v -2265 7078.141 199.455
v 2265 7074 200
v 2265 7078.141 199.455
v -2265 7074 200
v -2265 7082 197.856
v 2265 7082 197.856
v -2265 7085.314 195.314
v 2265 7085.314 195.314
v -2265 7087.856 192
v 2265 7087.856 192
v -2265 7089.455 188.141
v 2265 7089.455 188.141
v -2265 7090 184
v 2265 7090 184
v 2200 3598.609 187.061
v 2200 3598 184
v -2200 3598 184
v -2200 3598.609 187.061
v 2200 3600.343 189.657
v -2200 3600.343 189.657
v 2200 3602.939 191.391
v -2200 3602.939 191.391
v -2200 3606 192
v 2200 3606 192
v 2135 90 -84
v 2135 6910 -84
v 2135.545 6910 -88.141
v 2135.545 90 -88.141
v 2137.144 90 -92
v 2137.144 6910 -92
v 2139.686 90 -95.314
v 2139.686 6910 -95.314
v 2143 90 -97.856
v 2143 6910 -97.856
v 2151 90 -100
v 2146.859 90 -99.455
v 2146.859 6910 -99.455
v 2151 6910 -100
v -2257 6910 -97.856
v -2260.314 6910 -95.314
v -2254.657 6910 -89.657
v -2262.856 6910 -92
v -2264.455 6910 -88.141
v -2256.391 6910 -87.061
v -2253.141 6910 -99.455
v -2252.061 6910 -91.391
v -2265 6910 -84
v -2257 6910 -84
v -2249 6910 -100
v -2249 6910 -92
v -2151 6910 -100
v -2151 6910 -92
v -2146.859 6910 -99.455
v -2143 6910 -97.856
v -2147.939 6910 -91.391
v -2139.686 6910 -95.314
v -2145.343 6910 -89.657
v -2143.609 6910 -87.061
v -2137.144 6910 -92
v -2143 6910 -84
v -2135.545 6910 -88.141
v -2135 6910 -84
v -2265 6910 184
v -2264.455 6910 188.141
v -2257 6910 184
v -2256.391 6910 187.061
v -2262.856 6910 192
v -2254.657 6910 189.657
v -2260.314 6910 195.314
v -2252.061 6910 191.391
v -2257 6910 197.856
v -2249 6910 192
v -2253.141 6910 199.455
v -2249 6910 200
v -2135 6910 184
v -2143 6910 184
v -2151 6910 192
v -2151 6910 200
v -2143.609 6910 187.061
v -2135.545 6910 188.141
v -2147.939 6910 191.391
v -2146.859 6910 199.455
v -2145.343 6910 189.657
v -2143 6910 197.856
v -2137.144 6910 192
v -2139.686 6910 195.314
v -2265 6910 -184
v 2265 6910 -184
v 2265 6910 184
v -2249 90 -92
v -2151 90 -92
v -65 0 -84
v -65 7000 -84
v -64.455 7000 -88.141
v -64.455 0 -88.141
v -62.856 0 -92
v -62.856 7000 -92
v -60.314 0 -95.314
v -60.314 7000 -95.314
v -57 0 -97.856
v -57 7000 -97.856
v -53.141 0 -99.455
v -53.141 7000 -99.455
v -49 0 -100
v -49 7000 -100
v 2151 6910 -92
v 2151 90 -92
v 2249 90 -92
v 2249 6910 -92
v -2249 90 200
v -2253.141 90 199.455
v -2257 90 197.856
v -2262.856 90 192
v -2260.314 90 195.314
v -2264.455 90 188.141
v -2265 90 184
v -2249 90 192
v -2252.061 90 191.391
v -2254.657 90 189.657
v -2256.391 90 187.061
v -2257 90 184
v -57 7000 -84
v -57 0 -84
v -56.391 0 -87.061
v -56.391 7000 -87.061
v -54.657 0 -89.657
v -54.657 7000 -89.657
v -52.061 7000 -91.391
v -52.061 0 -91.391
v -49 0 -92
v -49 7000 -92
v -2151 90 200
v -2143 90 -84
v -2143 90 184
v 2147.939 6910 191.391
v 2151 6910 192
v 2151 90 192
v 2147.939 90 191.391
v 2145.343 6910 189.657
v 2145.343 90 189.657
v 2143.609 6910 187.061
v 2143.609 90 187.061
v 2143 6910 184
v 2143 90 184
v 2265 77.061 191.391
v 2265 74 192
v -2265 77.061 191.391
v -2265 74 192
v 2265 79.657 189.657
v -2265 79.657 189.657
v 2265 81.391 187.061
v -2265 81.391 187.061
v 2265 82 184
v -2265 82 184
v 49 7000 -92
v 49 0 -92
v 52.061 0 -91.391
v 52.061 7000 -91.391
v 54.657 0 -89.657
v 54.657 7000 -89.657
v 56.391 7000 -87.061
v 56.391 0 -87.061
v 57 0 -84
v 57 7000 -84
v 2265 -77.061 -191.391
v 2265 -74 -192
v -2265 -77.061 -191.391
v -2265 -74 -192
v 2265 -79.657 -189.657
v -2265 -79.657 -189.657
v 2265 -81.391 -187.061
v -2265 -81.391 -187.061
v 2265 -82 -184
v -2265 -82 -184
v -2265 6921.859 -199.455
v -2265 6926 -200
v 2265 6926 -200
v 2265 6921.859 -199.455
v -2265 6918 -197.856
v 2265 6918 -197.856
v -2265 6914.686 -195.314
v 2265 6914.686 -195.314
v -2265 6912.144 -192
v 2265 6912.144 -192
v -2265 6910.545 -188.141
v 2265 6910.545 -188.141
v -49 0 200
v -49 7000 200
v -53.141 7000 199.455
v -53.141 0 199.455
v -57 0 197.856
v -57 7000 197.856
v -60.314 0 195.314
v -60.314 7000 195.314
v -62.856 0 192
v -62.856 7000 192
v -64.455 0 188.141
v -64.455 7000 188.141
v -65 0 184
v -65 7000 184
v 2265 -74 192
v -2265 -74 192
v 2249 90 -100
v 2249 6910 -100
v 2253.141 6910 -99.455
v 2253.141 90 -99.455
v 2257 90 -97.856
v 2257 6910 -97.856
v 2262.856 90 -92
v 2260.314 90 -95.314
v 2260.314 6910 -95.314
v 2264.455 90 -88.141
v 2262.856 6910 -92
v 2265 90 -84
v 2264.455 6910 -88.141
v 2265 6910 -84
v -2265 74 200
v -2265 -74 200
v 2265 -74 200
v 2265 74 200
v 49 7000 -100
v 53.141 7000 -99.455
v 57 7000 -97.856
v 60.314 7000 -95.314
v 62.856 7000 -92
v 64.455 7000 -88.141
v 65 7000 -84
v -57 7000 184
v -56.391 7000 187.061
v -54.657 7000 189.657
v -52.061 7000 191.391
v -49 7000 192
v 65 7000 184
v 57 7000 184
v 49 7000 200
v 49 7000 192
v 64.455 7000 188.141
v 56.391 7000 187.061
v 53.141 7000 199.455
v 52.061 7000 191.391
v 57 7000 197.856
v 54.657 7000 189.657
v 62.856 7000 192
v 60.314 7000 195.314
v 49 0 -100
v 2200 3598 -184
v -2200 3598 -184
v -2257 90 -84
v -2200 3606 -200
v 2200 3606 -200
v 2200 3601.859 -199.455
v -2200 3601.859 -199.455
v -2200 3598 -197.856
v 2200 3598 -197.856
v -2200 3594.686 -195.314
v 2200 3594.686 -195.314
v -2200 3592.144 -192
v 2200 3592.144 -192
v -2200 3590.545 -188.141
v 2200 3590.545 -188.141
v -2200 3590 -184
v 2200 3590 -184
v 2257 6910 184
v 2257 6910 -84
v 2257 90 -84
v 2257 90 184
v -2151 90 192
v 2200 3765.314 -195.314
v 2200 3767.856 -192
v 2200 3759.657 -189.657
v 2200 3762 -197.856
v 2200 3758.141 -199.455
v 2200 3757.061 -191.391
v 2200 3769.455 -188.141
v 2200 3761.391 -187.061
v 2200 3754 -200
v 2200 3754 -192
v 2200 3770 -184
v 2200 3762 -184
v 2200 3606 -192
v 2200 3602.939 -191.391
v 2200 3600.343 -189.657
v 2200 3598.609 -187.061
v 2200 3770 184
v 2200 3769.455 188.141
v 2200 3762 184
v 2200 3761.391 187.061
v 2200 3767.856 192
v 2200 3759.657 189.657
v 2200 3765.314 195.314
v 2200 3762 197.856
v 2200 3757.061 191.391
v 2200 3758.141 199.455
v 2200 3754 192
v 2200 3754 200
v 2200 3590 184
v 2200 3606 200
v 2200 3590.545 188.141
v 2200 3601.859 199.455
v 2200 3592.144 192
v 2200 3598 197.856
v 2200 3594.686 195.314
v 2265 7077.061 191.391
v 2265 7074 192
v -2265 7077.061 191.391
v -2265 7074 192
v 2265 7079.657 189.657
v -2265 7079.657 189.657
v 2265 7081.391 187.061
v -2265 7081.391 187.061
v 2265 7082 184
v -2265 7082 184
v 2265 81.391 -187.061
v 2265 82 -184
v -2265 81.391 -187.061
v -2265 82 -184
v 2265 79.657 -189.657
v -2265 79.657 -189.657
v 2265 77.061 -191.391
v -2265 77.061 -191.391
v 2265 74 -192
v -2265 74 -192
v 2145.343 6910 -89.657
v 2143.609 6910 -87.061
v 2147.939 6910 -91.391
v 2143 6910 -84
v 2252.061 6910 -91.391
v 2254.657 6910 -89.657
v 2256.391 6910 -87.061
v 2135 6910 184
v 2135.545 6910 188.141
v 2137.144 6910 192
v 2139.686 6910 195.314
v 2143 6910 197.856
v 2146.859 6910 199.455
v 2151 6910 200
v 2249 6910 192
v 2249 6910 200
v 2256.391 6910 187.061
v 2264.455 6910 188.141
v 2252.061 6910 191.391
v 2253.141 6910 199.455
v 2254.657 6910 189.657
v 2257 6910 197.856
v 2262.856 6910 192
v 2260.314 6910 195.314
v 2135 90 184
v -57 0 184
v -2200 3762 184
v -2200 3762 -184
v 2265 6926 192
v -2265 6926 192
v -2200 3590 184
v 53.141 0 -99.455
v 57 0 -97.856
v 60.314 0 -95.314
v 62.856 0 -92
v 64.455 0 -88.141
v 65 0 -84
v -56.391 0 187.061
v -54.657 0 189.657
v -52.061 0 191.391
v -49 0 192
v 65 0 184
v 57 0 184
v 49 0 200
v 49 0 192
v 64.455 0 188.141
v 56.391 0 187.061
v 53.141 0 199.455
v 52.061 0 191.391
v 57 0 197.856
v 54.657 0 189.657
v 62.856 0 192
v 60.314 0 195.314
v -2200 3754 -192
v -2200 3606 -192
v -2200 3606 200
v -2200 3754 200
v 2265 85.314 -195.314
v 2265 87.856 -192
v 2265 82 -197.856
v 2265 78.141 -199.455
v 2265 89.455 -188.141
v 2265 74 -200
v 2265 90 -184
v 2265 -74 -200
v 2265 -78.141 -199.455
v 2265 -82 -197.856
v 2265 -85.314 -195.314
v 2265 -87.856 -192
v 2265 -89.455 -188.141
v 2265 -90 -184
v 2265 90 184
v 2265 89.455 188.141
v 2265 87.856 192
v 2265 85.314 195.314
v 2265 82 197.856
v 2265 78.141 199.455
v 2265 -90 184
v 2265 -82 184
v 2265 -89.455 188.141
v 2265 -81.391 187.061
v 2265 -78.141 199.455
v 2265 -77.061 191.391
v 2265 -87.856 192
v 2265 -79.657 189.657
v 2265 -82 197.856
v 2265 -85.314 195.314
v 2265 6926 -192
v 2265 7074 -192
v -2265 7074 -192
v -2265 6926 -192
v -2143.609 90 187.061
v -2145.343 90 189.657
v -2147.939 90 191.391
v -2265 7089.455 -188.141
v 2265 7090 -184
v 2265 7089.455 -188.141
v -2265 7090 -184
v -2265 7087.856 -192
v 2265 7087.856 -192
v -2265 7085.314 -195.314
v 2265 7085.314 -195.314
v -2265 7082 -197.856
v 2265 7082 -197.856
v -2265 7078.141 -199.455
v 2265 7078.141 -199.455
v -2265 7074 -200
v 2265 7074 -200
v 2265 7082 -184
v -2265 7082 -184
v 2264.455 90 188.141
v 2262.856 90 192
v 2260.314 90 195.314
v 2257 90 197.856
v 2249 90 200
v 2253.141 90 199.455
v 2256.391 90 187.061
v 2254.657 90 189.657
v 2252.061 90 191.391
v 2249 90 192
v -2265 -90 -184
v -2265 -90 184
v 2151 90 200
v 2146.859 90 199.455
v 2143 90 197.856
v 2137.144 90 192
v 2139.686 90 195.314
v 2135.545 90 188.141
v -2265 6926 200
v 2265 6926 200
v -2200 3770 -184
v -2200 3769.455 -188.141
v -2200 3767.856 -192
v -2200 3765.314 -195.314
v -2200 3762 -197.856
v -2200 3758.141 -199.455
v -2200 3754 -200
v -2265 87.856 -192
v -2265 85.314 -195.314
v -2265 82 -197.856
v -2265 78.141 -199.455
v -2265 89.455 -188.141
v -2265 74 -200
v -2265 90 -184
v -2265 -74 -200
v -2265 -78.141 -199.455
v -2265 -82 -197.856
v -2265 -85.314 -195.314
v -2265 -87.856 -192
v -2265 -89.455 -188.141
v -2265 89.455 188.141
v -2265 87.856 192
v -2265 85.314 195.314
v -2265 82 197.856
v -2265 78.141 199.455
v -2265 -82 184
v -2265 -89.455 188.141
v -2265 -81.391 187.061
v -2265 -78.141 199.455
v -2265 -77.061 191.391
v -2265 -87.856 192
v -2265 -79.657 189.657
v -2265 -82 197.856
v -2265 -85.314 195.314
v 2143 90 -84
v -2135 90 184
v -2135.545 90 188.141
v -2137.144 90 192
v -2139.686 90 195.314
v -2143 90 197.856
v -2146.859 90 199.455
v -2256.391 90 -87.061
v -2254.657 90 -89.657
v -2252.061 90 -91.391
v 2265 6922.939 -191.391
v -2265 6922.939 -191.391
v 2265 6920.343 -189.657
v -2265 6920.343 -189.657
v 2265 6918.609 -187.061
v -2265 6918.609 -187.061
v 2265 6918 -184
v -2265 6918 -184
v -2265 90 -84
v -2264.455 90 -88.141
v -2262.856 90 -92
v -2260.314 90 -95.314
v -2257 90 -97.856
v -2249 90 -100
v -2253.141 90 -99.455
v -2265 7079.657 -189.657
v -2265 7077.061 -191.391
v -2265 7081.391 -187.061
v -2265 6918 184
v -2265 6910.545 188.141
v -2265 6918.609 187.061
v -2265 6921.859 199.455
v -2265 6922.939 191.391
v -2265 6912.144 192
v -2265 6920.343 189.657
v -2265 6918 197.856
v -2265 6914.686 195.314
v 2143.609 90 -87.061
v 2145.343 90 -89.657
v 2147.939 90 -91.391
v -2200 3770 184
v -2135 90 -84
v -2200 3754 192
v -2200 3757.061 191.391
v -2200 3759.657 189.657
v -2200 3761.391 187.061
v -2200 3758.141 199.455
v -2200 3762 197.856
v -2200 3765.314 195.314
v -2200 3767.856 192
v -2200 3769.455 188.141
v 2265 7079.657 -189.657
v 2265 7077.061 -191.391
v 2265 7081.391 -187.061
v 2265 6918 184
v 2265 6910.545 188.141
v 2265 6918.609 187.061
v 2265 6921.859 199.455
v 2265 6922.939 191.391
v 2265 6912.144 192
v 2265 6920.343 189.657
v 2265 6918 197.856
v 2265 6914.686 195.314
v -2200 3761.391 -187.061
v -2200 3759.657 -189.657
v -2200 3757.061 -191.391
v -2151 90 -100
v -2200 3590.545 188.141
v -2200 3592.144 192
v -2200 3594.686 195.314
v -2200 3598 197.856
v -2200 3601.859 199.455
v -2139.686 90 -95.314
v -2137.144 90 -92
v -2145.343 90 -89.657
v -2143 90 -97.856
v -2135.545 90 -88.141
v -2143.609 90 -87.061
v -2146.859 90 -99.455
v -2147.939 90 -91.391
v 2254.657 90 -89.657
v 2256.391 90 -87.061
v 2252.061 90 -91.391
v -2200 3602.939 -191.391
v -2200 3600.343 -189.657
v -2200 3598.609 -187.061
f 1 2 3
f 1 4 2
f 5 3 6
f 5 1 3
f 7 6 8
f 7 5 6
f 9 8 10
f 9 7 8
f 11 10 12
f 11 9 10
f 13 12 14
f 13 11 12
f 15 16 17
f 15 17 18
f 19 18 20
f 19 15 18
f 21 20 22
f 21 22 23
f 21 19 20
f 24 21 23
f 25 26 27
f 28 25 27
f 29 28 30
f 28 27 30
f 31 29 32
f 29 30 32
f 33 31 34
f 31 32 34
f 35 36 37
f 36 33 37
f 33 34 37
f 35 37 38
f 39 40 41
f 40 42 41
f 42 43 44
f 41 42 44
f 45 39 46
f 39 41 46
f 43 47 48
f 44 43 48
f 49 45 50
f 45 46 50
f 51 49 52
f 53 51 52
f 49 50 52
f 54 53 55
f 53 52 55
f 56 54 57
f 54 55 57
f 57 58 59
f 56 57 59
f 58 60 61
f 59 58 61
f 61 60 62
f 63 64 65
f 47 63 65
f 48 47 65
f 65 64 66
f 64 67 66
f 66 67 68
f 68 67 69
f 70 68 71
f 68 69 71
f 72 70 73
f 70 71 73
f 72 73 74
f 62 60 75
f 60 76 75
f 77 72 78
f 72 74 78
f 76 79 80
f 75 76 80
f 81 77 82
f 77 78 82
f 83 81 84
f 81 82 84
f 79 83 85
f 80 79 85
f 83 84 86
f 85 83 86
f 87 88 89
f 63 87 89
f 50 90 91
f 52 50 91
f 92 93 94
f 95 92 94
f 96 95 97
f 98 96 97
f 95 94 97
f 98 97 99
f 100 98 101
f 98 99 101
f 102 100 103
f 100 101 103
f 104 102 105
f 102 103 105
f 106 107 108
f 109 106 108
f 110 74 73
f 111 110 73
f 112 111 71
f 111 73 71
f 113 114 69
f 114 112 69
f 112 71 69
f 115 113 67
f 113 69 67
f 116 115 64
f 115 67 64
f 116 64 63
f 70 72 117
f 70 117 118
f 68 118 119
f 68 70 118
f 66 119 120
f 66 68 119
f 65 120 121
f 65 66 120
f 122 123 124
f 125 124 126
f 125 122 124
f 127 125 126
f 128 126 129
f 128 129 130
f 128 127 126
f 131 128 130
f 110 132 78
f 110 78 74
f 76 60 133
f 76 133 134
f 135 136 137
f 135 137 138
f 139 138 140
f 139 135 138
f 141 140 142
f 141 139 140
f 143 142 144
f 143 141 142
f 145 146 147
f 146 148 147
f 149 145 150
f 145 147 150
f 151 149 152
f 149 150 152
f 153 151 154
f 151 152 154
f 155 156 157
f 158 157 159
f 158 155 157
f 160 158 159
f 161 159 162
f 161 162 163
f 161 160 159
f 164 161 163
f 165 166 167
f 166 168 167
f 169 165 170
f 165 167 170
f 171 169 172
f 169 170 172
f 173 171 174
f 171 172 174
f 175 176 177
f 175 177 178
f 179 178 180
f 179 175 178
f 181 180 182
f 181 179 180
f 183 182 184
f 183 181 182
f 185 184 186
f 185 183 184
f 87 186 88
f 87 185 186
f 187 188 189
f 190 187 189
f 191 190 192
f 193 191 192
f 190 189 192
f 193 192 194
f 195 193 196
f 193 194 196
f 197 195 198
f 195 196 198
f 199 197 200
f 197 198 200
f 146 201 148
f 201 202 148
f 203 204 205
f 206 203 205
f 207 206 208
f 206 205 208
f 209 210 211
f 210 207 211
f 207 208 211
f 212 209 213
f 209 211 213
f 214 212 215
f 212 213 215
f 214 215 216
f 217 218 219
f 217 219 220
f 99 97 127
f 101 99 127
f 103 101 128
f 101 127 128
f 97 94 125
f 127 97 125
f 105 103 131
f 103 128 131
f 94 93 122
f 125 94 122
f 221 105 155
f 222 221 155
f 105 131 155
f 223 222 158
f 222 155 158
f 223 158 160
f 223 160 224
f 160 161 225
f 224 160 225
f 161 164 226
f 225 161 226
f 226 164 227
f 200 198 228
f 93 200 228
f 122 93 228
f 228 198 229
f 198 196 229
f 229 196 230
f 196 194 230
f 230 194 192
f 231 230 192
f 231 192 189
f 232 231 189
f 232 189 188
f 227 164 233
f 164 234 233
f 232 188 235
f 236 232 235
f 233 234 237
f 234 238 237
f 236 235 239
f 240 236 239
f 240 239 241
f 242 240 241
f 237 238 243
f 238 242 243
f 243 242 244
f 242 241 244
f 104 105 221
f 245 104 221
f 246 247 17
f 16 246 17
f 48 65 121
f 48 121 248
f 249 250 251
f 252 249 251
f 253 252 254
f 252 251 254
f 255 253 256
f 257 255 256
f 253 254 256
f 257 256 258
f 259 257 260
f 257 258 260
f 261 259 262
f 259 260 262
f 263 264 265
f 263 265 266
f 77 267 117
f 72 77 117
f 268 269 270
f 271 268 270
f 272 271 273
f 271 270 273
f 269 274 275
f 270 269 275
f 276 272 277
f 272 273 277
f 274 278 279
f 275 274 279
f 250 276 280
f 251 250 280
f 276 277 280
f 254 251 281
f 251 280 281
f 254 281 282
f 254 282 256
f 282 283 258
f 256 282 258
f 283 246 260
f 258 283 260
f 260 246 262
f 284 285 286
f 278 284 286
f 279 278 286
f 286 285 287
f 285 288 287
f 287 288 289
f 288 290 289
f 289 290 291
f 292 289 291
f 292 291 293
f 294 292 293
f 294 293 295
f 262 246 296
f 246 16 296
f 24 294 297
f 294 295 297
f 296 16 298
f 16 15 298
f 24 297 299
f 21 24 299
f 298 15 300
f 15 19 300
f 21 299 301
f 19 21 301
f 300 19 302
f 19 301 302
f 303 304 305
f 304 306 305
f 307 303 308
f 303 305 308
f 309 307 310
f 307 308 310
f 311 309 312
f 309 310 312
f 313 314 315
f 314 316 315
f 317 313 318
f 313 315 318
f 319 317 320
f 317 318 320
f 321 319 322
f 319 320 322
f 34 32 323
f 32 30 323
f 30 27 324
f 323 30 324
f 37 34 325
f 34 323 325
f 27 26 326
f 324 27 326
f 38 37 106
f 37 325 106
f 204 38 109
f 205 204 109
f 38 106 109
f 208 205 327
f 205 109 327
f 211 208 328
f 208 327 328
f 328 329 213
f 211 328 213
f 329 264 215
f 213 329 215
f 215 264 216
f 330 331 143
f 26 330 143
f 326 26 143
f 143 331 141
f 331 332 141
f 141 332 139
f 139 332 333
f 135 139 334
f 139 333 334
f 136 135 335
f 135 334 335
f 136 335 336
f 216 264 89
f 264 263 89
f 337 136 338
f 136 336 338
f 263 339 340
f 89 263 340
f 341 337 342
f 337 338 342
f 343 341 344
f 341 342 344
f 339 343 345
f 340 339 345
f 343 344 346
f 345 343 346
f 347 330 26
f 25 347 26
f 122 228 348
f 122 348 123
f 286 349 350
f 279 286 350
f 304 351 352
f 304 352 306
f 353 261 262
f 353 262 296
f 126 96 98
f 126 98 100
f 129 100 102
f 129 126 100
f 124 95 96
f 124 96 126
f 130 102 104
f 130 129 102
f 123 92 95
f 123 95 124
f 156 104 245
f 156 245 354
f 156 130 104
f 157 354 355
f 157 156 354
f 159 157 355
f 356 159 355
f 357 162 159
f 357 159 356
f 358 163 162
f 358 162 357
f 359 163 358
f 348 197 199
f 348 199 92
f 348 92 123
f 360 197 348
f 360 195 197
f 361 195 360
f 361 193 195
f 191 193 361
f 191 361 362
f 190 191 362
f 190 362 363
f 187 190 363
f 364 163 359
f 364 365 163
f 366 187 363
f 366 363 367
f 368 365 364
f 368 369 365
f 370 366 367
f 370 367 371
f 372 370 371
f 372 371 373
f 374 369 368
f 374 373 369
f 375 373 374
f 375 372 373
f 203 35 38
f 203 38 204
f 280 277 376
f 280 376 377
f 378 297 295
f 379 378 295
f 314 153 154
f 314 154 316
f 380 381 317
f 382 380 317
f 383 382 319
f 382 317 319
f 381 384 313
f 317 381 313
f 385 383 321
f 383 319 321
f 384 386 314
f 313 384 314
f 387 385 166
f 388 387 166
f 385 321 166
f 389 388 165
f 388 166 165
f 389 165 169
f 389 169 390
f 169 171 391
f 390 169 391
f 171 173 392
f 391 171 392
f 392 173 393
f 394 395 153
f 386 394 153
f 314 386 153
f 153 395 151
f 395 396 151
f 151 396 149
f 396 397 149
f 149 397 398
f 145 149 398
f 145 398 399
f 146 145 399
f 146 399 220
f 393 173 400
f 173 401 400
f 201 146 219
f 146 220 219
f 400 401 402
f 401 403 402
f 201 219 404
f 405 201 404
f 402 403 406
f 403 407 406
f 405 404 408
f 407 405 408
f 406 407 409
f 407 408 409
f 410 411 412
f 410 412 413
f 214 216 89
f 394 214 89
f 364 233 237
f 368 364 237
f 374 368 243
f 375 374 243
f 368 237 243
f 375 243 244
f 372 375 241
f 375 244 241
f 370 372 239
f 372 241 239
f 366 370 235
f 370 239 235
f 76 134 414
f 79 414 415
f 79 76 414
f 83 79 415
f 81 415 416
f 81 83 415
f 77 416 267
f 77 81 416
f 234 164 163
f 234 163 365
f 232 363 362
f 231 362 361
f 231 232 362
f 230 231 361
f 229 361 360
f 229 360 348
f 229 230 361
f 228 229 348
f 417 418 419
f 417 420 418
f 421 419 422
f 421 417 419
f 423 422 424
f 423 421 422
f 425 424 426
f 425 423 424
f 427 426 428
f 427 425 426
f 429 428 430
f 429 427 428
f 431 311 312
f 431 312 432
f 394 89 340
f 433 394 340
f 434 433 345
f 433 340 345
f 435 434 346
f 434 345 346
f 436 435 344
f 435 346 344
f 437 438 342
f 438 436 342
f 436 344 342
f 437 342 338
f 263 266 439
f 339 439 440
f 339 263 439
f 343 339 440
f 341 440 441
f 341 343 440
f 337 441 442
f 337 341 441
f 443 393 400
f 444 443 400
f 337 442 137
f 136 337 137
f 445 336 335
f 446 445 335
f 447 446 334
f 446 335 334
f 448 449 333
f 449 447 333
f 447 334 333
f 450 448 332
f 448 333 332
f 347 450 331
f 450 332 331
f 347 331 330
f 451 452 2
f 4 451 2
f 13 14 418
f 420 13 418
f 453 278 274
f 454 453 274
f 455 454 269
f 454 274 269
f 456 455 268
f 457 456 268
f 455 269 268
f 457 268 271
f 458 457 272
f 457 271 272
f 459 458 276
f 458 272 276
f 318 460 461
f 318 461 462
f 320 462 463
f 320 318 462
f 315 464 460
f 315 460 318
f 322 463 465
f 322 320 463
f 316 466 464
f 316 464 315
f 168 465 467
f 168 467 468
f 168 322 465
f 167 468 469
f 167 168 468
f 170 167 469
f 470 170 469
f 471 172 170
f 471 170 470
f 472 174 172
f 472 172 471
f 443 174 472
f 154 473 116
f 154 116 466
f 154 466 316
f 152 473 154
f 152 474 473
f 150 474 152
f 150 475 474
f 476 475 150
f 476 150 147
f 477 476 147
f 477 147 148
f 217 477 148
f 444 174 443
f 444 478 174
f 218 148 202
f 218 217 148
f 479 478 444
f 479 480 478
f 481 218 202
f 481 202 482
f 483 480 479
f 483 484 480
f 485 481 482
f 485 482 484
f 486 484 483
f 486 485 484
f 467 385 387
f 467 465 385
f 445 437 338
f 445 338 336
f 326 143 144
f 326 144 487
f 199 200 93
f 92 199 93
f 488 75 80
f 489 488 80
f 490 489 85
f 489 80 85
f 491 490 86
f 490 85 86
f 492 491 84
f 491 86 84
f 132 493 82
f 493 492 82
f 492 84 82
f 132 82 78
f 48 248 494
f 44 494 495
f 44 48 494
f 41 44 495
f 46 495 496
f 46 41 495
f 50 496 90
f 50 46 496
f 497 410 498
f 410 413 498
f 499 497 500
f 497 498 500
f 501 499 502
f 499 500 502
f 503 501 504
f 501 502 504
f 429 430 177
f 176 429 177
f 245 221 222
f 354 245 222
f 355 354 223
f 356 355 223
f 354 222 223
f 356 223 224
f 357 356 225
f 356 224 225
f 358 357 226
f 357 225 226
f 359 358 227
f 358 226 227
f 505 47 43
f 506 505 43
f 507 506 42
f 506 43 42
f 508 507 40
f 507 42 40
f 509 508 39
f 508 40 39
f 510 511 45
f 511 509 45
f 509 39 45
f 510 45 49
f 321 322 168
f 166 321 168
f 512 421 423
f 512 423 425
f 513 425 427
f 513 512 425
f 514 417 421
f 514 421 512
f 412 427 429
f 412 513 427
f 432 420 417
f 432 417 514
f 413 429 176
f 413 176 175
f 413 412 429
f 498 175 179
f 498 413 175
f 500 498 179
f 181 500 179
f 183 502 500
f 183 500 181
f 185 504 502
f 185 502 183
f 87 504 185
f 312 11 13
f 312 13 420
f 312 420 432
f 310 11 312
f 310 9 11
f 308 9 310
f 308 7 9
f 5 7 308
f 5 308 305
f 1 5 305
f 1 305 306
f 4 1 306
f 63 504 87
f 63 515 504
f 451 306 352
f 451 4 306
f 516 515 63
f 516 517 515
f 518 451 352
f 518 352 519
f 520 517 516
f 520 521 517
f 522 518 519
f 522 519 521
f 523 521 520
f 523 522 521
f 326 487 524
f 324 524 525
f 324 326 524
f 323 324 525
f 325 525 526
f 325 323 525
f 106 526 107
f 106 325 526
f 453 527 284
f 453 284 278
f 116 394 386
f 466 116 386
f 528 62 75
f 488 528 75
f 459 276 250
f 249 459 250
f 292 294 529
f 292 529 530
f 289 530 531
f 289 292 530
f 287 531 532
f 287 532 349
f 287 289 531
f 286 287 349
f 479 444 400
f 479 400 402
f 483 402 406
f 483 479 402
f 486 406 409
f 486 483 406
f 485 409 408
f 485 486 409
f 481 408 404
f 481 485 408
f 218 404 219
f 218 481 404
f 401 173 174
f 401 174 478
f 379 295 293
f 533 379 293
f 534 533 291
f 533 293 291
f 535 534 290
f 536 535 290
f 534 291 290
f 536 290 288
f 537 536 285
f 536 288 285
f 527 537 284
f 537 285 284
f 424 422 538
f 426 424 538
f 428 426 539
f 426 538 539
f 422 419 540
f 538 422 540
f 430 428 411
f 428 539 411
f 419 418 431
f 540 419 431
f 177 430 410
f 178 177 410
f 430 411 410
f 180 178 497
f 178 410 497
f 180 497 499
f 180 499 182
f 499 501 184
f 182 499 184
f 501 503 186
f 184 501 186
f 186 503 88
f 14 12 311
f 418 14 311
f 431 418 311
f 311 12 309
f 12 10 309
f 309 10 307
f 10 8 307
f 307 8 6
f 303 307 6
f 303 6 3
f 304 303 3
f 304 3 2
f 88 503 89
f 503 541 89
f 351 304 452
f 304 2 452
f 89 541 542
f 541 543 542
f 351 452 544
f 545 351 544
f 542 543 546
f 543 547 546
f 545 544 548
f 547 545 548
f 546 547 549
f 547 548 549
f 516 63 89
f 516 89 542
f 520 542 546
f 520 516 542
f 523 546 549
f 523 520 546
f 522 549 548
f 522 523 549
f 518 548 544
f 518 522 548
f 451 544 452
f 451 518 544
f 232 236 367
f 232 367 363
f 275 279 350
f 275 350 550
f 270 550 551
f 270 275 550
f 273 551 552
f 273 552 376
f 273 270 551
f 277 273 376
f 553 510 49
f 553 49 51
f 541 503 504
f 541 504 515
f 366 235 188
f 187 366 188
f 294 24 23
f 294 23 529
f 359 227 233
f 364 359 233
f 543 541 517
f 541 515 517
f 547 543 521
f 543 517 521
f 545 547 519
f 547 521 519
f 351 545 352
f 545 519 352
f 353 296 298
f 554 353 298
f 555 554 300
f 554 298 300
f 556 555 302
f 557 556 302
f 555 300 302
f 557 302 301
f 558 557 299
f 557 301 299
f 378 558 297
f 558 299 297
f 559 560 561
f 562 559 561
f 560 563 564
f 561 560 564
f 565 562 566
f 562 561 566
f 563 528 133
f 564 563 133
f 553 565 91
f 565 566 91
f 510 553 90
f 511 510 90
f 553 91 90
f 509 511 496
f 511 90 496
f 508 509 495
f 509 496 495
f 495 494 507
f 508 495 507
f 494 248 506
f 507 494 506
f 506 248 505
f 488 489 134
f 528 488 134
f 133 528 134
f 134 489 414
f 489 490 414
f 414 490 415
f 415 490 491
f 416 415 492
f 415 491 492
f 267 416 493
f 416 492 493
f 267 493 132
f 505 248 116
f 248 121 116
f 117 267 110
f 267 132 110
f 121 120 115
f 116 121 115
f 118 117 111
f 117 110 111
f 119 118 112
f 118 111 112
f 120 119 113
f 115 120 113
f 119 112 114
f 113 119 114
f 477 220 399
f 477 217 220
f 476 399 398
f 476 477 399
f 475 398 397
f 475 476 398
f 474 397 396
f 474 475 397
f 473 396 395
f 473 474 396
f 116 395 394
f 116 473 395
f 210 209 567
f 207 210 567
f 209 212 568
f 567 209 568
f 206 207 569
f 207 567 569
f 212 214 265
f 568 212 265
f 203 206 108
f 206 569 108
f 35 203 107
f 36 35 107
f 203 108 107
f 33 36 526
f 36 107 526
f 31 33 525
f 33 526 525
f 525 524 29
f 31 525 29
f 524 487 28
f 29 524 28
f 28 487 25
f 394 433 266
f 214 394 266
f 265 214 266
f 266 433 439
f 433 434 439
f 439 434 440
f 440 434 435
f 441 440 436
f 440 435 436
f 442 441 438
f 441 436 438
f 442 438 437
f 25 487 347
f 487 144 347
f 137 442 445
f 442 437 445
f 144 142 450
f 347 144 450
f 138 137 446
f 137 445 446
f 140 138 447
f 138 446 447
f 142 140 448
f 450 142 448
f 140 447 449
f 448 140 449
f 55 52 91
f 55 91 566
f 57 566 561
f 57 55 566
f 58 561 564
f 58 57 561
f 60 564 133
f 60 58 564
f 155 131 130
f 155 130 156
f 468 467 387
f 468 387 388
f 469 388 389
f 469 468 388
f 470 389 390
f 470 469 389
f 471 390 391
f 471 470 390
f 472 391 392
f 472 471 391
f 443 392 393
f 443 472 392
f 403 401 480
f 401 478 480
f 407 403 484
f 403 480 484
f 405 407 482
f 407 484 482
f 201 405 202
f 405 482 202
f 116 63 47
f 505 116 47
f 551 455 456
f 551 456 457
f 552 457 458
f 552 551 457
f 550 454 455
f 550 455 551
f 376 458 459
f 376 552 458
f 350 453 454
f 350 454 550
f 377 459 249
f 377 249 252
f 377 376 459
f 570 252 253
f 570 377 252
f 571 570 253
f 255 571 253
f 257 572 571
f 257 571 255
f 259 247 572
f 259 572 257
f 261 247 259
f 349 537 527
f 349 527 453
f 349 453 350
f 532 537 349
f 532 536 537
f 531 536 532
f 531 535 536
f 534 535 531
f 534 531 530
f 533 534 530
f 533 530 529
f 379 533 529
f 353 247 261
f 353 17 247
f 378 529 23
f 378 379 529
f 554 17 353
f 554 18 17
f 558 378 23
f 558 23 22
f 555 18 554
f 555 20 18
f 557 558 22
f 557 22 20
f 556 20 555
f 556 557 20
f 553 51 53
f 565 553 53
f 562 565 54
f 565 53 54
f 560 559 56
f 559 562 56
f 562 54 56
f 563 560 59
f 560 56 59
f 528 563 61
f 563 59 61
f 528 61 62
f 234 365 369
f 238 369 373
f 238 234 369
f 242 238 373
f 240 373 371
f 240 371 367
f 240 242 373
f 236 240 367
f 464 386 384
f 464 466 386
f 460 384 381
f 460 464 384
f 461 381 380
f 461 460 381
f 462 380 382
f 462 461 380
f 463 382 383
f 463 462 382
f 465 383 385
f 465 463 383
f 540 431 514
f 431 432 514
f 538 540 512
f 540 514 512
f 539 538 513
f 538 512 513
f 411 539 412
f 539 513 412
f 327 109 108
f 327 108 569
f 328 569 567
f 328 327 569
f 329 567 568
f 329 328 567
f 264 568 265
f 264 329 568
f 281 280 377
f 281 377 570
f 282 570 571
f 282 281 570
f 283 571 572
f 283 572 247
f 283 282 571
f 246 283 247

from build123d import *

# Parameters (mm, degrees)
TUBO_RECTANGULAR_120_X_80_X_8_1_DEPTH   = 4400
TUBO_RECTANGULAR_120_X_80_X_8_1_2_DEPTH = 4400
TUBO_RECTANGULAR_120_X_80_X_8_1_3_DEPTH = 4400
TUBO_RECTANGULAR_120_X_80_X_8_2_DEPTH   = 7000
TUBO_RECTANGULAR_120_X_80_X_8_2_2_DEPTH = 7000
TUBO_RECTANGULAR_120_X_80_X_8_2_3_DEPTH = 7000
PART_START                              = 3522.731512022
PART_RUN_ON_DEPTH                       = 942.268487978
PART_START_2                            = 877.268487978
PART_RUN_ON_2_DEPTH                     = 942.268487978
BODY_START                              = 3522.731512022
BODY_3_RUN_ON_DEPTH                     = 942.268487978
BODY_START_2                            = 877.268487978
BODY_3_RUN_ON_2_DEPTH                   = 942.268487978


with BuildPart() as part:
    # Sketch1 → Tubo rectangular 120 X 80 X 8(1) (new body)
    with BuildSketch(Plane(origin=(2200, 0, 0), x_dir=(0, -1, 0), z_dir=(-1, 0, 0))):
        with BuildLine():
            Line((-74, -200), (74, -200))
            ThreePointArc((74, -200), (85.313708499, -195.313708499), (90, -184))
            Line((90, -184), (90, 184))
            ThreePointArc((90, 184), (85.313708499, 195.313708499), (74, 200))
            Line((74, 200), (-74, 200))
            ThreePointArc((-74, 200), (-85.313708499, 195.313708499), (-90, 184))
            Line((-90, 184), (-90, -184))
            ThreePointArc((-90, -184), (-85.313708499, -195.313708499), (-74, -200))
        make_face()
        with BuildLine():
            Line((-74, -192), (74, -192))
            ThreePointArc((74, -192), (79.656854249, -189.656854249), (82, -184))
            Line((82, -184), (82, 184))
            ThreePointArc((82, 184), (79.656854249, 189.656854249), (74, 192))
            Line((74, 192), (-74, 192))
            ThreePointArc((-74, 192), (-79.656854249, 189.656854249), (-82, 184))
            Line((-82, 184), (-82, -184))
            ThreePointArc((-82, -184), (-79.656854249, -189.656854249), (-74, -192))
        make_face(mode=Mode.SUBTRACT)
    extrude(amount=TUBO_RECTANGULAR_120_X_80_X_8_1_DEPTH)

    # part cut square before the run-on
    split(bisect_by=Plane.YZ.offset(-1322.731512022), keep=Keep.TOP)

    # Sketch1 → part run on (add)
    with BuildSketch(Plane(origin=(2200, 0, 0), x_dir=(0, -1, 0), z_dir=(-1, 0, 0)).offset(PART_START)):
        with BuildLine():
            Line((-74, -200), (74, -200))
            ThreePointArc((74, -200), (85.313708499, -195.313708499), (90, -184))
            Line((90, -184), (90, 184))
            ThreePointArc((90, 184), (85.313708499, 195.313708499), (74, 200))
            Line((74, 200), (-74, 200))
            ThreePointArc((-74, 200), (-85.313708499, 195.313708499), (-90, 184))
            Line((-90, 184), (-90, -184))
            ThreePointArc((-90, -184), (-85.313708499, -195.313708499), (-74, -200))
        make_face()
        with BuildLine():
            Line((-74, -192), (74, -192))
            ThreePointArc((74, -192), (79.656854249, -189.656854249), (82, -184))
            Line((82, -184), (82, 184))
            ThreePointArc((82, 184), (79.656854249, 189.656854249), (74, 192))
            Line((74, 192), (-74, 192))
            ThreePointArc((-74, 192), (-79.656854249, 189.656854249), (-82, 184))
            Line((-82, 184), (-82, -184))
            ThreePointArc((-82, -184), (-79.656854249, -189.656854249), (-74, -192))
        make_face(mode=Mode.SUBTRACT)
    extrude(amount=PART_RUN_ON_DEPTH)

    # part cut square before the run-on
    split(bisect_by=Plane(origin=(1322.731512022, 0, 0), x_dir=(0, -1, 0), z_dir=(-1, 0, 0)), keep=Keep.TOP)

    # Sketch1 → part run on 2 (add)
    with BuildSketch(Plane(origin=(2200, 0, 0), x_dir=(0, -1, 0), z_dir=(-1, 0, 0)).offset(PART_START_2)):
        with BuildLine():
            Line((-74, -200), (74, -200))
            ThreePointArc((74, -200), (85.313708499, -195.313708499), (90, -184))
            Line((90, -184), (90, 184))
            ThreePointArc((90, 184), (85.313708499, 195.313708499), (74, 200))
            Line((74, 200), (-74, 200))
            ThreePointArc((-74, 200), (-85.313708499, 195.313708499), (-90, 184))
            Line((-90, 184), (-90, -184))
            ThreePointArc((-90, -184), (-85.313708499, -195.313708499), (-74, -200))
        make_face()
        with BuildLine():
            Line((-74, -192), (74, -192))
            ThreePointArc((74, -192), (79.656854249, -189.656854249), (82, -184))
            Line((82, -184), (82, 184))
            ThreePointArc((82, 184), (79.656854249, 189.656854249), (74, 192))
            Line((74, 192), (-74, 192))
            ThreePointArc((-74, 192), (-79.656854249, 189.656854249), (-82, 184))
            Line((-82, 184), (-82, -184))
            ThreePointArc((-82, -184), (-79.656854249, -189.656854249), (-74, -192))
        make_face(mode=Mode.SUBTRACT)
    extrude(amount=-PART_RUN_ON_2_DEPTH)


with BuildPart() as body_2:
    # Sketch1 on segment 2 (carried to segment 2) → Tubo rectangular 120 X 80 X 8_1 2 (new body)
    with BuildSketch(Plane(origin=(2200, 3680, 0), x_dir=(0, -1, 0), z_dir=(-1, 0, 0))):
        with BuildLine():
            Line((-74, -200), (74, -200))
            ThreePointArc((74, -200), (85.313708499, -195.313708499), (90, -184))
            Line((90, -184), (90, 184))
            ThreePointArc((90, 184), (85.313708499, 195.313708499), (74, 200))
            Line((74, 200), (-74, 200))
            ThreePointArc((-74, 200), (-85.313708499, 195.313708499), (-90, 184))
            Line((-90, 184), (-90, -184))
            ThreePointArc((-90, -184), (-85.313708499, -195.313708499), (-74, -200))
        make_face()
        with BuildLine():
            Line((-74, -192), (74, -192))
            ThreePointArc((74, -192), (79.656854249, -189.656854249), (82, -184))
            Line((82, -184), (82, 184))
            ThreePointArc((82, 184), (79.656854249, 189.656854249), (74, 192))
            Line((74, 192), (-74, 192))
            ThreePointArc((-74, 192), (-79.656854249, 189.656854249), (-82, 184))
            Line((-82, 184), (-82, -184))
            ThreePointArc((-82, -184), (-79.656854249, -189.656854249), (-74, -192))
        make_face(mode=Mode.SUBTRACT)
    extrude(amount=TUBO_RECTANGULAR_120_X_80_X_8_1_2_DEPTH)


with BuildPart() as body_3:
    # Sketch1 on segment 3 (carried to segment 3) → Tubo rectangular 120 X 80 X 8_1 3 (new body)
    with BuildSketch(Plane(origin=(2200, 7000, 0), x_dir=(0, -1, 0), z_dir=(-1, 0, 0))):
        with BuildLine():
            Line((-74, -200), (74, -200))
            ThreePointArc((74, -200), (85.313708499, -195.313708499), (90, -184))
            Line((90, -184), (90, 184))
            ThreePointArc((90, 184), (85.313708499, 195.313708499), (74, 200))
            Line((74, 200), (-74, 200))
            ThreePointArc((-74, 200), (-85.313708499, 195.313708499), (-90, 184))
            Line((-90, 184), (-90, -184))
            ThreePointArc((-90, -184), (-85.313708499, -195.313708499), (-74, -200))
        make_face()
        with BuildLine():
            Line((-74, -192), (74, -192))
            ThreePointArc((74, -192), (79.656854249, -189.656854249), (82, -184))
            Line((82, -184), (82, 184))
            ThreePointArc((82, 184), (79.656854249, 189.656854249), (74, 192))
            Line((74, 192), (-74, 192))
            ThreePointArc((-74, 192), (-79.656854249, 189.656854249), (-82, 184))
            Line((-82, 184), (-82, -184))
            ThreePointArc((-82, -184), (-79.656854249, -189.656854249), (-74, -192))
        make_face(mode=Mode.SUBTRACT)
    extrude(amount=TUBO_RECTANGULAR_120_X_80_X_8_1_3_DEPTH)

    # body 3 cut square before the run-on
    split(bisect_by=Plane(origin=(-1322.731512022, 7000, 0), x_dir=(0, 1, 0), z_dir=(1, 0, 0)), keep=Keep.TOP)

    # Sketch1 on segment 3 (carried to segment 3) → body 3 run on (add)
    with BuildSketch(Plane(origin=(2200, 7000, 0), x_dir=(0, -1, 0), z_dir=(-1, 0, 0)).offset(BODY_START)):
        with BuildLine():
            Line((-74, -200), (74, -200))
            ThreePointArc((74, -200), (85.313708499, -195.313708499), (90, -184))
            Line((90, -184), (90, 184))
            ThreePointArc((90, 184), (85.313708499, 195.313708499), (74, 200))
            Line((74, 200), (-74, 200))
            ThreePointArc((-74, 200), (-85.313708499, 195.313708499), (-90, 184))
            Line((-90, 184), (-90, -184))
            ThreePointArc((-90, -184), (-85.313708499, -195.313708499), (-74, -200))
        make_face()
        with BuildLine():
            Line((-74, -192), (74, -192))
            ThreePointArc((74, -192), (79.656854249, -189.656854249), (82, -184))
            Line((82, -184), (82, 184))
            ThreePointArc((82, 184), (79.656854249, 189.656854249), (74, 192))
            Line((74, 192), (-74, 192))
            ThreePointArc((-74, 192), (-79.656854249, 189.656854249), (-82, 184))
            Line((-82, 184), (-82, -184))
            ThreePointArc((-82, -184), (-79.656854249, -189.656854249), (-74, -192))
        make_face(mode=Mode.SUBTRACT)
    extrude(amount=BODY_3_RUN_ON_DEPTH)

    # body 3 cut square before the run-on
    split(bisect_by=Plane(origin=(1322.731512022, 7000, 0), x_dir=(0, -1, 0), z_dir=(-1, 0, 0)), keep=Keep.TOP)

    # Sketch1 on segment 3 (carried to segment 3) → body 3 run on 2 (add)
    with BuildSketch(Plane(origin=(2200, 7000, 0), x_dir=(0, -1, 0), z_dir=(-1, 0, 0)).offset(BODY_START_2)):
        with BuildLine():
            Line((-74, -200), (74, -200))
            ThreePointArc((74, -200), (85.313708499, -195.313708499), (90, -184))
            Line((90, -184), (90, 184))
            ThreePointArc((90, 184), (85.313708499, 195.313708499), (74, 200))
            Line((74, 200), (-74, 200))
            ThreePointArc((-74, 200), (-85.313708499, 195.313708499), (-90, 184))
            Line((-90, 184), (-90, -184))
            ThreePointArc((-90, -184), (-85.313708499, -195.313708499), (-74, -200))
        make_face()
        with BuildLine():
            Line((-74, -192), (74, -192))
            ThreePointArc((74, -192), (79.656854249, -189.656854249), (82, -184))
            Line((82, -184), (82, 184))
            ThreePointArc((82, 184), (79.656854249, 189.656854249), (74, 192))
            Line((74, 192), (-74, 192))
            ThreePointArc((-74, 192), (-79.656854249, 189.656854249), (-82, 184))
            Line((-82, 184), (-82, -184))
            ThreePointArc((-82, -184), (-79.656854249, -189.656854249), (-74, -192))
        make_face(mode=Mode.SUBTRACT)
    extrude(amount=-BODY_3_RUN_ON_2_DEPTH)


with BuildPart() as body_4:
    # Sketch13 → Tubo rectangular 120 X 80 X 8(2) (new body)
    with BuildSketch(Plane(origin=(-2200, 7000, 50), x_dir=(1, 0, 0), z_dir=(0, -1, 0))):
        with BuildLine():
            Line((-49, -150), (49, -150))
            ThreePointArc((49, -150), (60.313708499, -145.313708499), (65, -134))
            Line((65, -134), (65, 134))
            ThreePointArc((65, 134), (60.313708499, 145.313708499), (49, 150))
            Line((49, 150), (-49, 150))
            ThreePointArc((-49, 150), (-60.313708499, 145.313708499), (-65, 134))
            Line((-65, 134), (-65, -134))
            ThreePointArc((-65, -134), (-60.313708499, -145.313708499), (-49, -150))
        make_face()
        with BuildLine():
            Line((-49, -142), (49, -142))
            ThreePointArc((49, -142), (54.656854249, -139.656854249), (57, -134))
            Line((57, -134), (57, 134))
            ThreePointArc((57, 134), (54.656854249, 139.656854249), (49, 142))
            Line((49, 142), (-49, 142))
            ThreePointArc((-49, 142), (-54.656854249, 139.656854249), (-57, 134))
            Line((-57, 134), (-57, -134))
            ThreePointArc((-57, -134), (-54.656854249, -139.656854249), (-49, -142))
        make_face(mode=Mode.SUBTRACT)
    extrude(amount=TUBO_RECTANGULAR_120_X_80_X_8_2_DEPTH)

    # Recortar_Extender1 3
    split(bisect_by=Plane(origin=(0, 90, 0), x_dir=(-1, 0, 0), z_dir=(0, 1, 0)), keep=Keep.TOP)

    # Recortar/Extender3
    split(bisect_by=Plane.XZ.offset(-6910), keep=Keep.TOP)


with BuildPart() as body_5:
    # Sketch13 on segment 2 (carried to segment 2) → Tubo rectangular 120 X 80 X 8_2 2 (new body)
    with BuildSketch(Plane(origin=(0, 7000, 50), x_dir=(1, 0, 0), z_dir=(0, -1, 0))):
        with BuildLine():
            Line((-49, -150), (49, -150))
            ThreePointArc((49, -150), (60.313708499, -145.313708499), (65, -134))
            Line((65, -134), (65, 134))
            ThreePointArc((65, 134), (60.313708499, 145.313708499), (49, 150))
            Line((49, 150), (-49, 150))
            ThreePointArc((-49, 150), (-60.313708499, 145.313708499), (-65, 134))
            Line((-65, 134), (-65, -134))
            ThreePointArc((-65, -134), (-60.313708499, -145.313708499), (-49, -150))
        make_face()
        with BuildLine():
            Line((-49, -142), (49, -142))
            ThreePointArc((49, -142), (54.656854249, -139.656854249), (57, -134))
            Line((57, -134), (57, 134))
            ThreePointArc((57, 134), (54.656854249, 139.656854249), (49, 142))
            Line((49, 142), (-49, 142))
            ThreePointArc((-49, 142), (-54.656854249, 139.656854249), (-57, 134))
            Line((-57, 134), (-57, -134))
            ThreePointArc((-57, -134), (-54.656854249, -139.656854249), (-49, -142))
        make_face(mode=Mode.SUBTRACT)
    extrude(amount=TUBO_RECTANGULAR_120_X_80_X_8_2_2_DEPTH)


with BuildPart() as body_6:
    # Sketch13 on segment 3 (carried to segment 3) → Tubo rectangular 120 X 80 X 8_2 3 (new body)
    with BuildSketch(Plane(origin=(2200, 7000, 50), x_dir=(1, 0, 0), z_dir=(0, -1, 0))):
        with BuildLine():
            Line((-49, -150), (49, -150))
            ThreePointArc((49, -150), (60.313708499, -145.313708499), (65, -134))
            Line((65, -134), (65, 134))
            ThreePointArc((65, 134), (60.313708499, 145.313708499), (49, 150))
            Line((49, 150), (-49, 150))
            ThreePointArc((-49, 150), (-60.313708499, 145.313708499), (-65, 134))
            Line((-65, 134), (-65, -134))
            ThreePointArc((-65, -134), (-60.313708499, -145.313708499), (-49, -150))
        make_face()
        with BuildLine():
            Line((-49, -142), (49, -142))
            ThreePointArc((49, -142), (54.656854249, -139.656854249), (57, -134))
            Line((57, -134), (57, 134))
            ThreePointArc((57, 134), (54.656854249, 139.656854249), (49, 142))
            Line((49, 142), (-49, 142))
            ThreePointArc((-49, 142), (-54.656854249, 139.656854249), (-57, 134))
            Line((-57, 134), (-57, -134))
            ThreePointArc((-57, -134), (-54.656854249, -139.656854249), (-49, -142))
        make_face(mode=Mode.SUBTRACT)
    extrude(amount=TUBO_RECTANGULAR_120_X_80_X_8_2_3_DEPTH)

    # Recortar_Extender2 6
    split(bisect_by=Plane(origin=(-32.5, 82, 0), x_dir=(-1, 0, 0), z_dir=(0, 1, 0)), keep=Keep.TOP)

    # Recortar_Extender2 7
    split(bisect_by=Plane(origin=(-32.5, 90, 0), x_dir=(-1, 0, 0), z_dir=(0, 1, 0)), keep=Keep.TOP)

    # Recortar/Extender4
    split(bisect_by=Plane(origin=(-32.5, 6910, 0), x_dir=(1, 0, 0), z_dir=(0, -1, 0)), keep=Keep.TOP)


solid = Compound([part.part, body_2.part, body_3.part, body_4.part, body_5.part, body_6.part])
